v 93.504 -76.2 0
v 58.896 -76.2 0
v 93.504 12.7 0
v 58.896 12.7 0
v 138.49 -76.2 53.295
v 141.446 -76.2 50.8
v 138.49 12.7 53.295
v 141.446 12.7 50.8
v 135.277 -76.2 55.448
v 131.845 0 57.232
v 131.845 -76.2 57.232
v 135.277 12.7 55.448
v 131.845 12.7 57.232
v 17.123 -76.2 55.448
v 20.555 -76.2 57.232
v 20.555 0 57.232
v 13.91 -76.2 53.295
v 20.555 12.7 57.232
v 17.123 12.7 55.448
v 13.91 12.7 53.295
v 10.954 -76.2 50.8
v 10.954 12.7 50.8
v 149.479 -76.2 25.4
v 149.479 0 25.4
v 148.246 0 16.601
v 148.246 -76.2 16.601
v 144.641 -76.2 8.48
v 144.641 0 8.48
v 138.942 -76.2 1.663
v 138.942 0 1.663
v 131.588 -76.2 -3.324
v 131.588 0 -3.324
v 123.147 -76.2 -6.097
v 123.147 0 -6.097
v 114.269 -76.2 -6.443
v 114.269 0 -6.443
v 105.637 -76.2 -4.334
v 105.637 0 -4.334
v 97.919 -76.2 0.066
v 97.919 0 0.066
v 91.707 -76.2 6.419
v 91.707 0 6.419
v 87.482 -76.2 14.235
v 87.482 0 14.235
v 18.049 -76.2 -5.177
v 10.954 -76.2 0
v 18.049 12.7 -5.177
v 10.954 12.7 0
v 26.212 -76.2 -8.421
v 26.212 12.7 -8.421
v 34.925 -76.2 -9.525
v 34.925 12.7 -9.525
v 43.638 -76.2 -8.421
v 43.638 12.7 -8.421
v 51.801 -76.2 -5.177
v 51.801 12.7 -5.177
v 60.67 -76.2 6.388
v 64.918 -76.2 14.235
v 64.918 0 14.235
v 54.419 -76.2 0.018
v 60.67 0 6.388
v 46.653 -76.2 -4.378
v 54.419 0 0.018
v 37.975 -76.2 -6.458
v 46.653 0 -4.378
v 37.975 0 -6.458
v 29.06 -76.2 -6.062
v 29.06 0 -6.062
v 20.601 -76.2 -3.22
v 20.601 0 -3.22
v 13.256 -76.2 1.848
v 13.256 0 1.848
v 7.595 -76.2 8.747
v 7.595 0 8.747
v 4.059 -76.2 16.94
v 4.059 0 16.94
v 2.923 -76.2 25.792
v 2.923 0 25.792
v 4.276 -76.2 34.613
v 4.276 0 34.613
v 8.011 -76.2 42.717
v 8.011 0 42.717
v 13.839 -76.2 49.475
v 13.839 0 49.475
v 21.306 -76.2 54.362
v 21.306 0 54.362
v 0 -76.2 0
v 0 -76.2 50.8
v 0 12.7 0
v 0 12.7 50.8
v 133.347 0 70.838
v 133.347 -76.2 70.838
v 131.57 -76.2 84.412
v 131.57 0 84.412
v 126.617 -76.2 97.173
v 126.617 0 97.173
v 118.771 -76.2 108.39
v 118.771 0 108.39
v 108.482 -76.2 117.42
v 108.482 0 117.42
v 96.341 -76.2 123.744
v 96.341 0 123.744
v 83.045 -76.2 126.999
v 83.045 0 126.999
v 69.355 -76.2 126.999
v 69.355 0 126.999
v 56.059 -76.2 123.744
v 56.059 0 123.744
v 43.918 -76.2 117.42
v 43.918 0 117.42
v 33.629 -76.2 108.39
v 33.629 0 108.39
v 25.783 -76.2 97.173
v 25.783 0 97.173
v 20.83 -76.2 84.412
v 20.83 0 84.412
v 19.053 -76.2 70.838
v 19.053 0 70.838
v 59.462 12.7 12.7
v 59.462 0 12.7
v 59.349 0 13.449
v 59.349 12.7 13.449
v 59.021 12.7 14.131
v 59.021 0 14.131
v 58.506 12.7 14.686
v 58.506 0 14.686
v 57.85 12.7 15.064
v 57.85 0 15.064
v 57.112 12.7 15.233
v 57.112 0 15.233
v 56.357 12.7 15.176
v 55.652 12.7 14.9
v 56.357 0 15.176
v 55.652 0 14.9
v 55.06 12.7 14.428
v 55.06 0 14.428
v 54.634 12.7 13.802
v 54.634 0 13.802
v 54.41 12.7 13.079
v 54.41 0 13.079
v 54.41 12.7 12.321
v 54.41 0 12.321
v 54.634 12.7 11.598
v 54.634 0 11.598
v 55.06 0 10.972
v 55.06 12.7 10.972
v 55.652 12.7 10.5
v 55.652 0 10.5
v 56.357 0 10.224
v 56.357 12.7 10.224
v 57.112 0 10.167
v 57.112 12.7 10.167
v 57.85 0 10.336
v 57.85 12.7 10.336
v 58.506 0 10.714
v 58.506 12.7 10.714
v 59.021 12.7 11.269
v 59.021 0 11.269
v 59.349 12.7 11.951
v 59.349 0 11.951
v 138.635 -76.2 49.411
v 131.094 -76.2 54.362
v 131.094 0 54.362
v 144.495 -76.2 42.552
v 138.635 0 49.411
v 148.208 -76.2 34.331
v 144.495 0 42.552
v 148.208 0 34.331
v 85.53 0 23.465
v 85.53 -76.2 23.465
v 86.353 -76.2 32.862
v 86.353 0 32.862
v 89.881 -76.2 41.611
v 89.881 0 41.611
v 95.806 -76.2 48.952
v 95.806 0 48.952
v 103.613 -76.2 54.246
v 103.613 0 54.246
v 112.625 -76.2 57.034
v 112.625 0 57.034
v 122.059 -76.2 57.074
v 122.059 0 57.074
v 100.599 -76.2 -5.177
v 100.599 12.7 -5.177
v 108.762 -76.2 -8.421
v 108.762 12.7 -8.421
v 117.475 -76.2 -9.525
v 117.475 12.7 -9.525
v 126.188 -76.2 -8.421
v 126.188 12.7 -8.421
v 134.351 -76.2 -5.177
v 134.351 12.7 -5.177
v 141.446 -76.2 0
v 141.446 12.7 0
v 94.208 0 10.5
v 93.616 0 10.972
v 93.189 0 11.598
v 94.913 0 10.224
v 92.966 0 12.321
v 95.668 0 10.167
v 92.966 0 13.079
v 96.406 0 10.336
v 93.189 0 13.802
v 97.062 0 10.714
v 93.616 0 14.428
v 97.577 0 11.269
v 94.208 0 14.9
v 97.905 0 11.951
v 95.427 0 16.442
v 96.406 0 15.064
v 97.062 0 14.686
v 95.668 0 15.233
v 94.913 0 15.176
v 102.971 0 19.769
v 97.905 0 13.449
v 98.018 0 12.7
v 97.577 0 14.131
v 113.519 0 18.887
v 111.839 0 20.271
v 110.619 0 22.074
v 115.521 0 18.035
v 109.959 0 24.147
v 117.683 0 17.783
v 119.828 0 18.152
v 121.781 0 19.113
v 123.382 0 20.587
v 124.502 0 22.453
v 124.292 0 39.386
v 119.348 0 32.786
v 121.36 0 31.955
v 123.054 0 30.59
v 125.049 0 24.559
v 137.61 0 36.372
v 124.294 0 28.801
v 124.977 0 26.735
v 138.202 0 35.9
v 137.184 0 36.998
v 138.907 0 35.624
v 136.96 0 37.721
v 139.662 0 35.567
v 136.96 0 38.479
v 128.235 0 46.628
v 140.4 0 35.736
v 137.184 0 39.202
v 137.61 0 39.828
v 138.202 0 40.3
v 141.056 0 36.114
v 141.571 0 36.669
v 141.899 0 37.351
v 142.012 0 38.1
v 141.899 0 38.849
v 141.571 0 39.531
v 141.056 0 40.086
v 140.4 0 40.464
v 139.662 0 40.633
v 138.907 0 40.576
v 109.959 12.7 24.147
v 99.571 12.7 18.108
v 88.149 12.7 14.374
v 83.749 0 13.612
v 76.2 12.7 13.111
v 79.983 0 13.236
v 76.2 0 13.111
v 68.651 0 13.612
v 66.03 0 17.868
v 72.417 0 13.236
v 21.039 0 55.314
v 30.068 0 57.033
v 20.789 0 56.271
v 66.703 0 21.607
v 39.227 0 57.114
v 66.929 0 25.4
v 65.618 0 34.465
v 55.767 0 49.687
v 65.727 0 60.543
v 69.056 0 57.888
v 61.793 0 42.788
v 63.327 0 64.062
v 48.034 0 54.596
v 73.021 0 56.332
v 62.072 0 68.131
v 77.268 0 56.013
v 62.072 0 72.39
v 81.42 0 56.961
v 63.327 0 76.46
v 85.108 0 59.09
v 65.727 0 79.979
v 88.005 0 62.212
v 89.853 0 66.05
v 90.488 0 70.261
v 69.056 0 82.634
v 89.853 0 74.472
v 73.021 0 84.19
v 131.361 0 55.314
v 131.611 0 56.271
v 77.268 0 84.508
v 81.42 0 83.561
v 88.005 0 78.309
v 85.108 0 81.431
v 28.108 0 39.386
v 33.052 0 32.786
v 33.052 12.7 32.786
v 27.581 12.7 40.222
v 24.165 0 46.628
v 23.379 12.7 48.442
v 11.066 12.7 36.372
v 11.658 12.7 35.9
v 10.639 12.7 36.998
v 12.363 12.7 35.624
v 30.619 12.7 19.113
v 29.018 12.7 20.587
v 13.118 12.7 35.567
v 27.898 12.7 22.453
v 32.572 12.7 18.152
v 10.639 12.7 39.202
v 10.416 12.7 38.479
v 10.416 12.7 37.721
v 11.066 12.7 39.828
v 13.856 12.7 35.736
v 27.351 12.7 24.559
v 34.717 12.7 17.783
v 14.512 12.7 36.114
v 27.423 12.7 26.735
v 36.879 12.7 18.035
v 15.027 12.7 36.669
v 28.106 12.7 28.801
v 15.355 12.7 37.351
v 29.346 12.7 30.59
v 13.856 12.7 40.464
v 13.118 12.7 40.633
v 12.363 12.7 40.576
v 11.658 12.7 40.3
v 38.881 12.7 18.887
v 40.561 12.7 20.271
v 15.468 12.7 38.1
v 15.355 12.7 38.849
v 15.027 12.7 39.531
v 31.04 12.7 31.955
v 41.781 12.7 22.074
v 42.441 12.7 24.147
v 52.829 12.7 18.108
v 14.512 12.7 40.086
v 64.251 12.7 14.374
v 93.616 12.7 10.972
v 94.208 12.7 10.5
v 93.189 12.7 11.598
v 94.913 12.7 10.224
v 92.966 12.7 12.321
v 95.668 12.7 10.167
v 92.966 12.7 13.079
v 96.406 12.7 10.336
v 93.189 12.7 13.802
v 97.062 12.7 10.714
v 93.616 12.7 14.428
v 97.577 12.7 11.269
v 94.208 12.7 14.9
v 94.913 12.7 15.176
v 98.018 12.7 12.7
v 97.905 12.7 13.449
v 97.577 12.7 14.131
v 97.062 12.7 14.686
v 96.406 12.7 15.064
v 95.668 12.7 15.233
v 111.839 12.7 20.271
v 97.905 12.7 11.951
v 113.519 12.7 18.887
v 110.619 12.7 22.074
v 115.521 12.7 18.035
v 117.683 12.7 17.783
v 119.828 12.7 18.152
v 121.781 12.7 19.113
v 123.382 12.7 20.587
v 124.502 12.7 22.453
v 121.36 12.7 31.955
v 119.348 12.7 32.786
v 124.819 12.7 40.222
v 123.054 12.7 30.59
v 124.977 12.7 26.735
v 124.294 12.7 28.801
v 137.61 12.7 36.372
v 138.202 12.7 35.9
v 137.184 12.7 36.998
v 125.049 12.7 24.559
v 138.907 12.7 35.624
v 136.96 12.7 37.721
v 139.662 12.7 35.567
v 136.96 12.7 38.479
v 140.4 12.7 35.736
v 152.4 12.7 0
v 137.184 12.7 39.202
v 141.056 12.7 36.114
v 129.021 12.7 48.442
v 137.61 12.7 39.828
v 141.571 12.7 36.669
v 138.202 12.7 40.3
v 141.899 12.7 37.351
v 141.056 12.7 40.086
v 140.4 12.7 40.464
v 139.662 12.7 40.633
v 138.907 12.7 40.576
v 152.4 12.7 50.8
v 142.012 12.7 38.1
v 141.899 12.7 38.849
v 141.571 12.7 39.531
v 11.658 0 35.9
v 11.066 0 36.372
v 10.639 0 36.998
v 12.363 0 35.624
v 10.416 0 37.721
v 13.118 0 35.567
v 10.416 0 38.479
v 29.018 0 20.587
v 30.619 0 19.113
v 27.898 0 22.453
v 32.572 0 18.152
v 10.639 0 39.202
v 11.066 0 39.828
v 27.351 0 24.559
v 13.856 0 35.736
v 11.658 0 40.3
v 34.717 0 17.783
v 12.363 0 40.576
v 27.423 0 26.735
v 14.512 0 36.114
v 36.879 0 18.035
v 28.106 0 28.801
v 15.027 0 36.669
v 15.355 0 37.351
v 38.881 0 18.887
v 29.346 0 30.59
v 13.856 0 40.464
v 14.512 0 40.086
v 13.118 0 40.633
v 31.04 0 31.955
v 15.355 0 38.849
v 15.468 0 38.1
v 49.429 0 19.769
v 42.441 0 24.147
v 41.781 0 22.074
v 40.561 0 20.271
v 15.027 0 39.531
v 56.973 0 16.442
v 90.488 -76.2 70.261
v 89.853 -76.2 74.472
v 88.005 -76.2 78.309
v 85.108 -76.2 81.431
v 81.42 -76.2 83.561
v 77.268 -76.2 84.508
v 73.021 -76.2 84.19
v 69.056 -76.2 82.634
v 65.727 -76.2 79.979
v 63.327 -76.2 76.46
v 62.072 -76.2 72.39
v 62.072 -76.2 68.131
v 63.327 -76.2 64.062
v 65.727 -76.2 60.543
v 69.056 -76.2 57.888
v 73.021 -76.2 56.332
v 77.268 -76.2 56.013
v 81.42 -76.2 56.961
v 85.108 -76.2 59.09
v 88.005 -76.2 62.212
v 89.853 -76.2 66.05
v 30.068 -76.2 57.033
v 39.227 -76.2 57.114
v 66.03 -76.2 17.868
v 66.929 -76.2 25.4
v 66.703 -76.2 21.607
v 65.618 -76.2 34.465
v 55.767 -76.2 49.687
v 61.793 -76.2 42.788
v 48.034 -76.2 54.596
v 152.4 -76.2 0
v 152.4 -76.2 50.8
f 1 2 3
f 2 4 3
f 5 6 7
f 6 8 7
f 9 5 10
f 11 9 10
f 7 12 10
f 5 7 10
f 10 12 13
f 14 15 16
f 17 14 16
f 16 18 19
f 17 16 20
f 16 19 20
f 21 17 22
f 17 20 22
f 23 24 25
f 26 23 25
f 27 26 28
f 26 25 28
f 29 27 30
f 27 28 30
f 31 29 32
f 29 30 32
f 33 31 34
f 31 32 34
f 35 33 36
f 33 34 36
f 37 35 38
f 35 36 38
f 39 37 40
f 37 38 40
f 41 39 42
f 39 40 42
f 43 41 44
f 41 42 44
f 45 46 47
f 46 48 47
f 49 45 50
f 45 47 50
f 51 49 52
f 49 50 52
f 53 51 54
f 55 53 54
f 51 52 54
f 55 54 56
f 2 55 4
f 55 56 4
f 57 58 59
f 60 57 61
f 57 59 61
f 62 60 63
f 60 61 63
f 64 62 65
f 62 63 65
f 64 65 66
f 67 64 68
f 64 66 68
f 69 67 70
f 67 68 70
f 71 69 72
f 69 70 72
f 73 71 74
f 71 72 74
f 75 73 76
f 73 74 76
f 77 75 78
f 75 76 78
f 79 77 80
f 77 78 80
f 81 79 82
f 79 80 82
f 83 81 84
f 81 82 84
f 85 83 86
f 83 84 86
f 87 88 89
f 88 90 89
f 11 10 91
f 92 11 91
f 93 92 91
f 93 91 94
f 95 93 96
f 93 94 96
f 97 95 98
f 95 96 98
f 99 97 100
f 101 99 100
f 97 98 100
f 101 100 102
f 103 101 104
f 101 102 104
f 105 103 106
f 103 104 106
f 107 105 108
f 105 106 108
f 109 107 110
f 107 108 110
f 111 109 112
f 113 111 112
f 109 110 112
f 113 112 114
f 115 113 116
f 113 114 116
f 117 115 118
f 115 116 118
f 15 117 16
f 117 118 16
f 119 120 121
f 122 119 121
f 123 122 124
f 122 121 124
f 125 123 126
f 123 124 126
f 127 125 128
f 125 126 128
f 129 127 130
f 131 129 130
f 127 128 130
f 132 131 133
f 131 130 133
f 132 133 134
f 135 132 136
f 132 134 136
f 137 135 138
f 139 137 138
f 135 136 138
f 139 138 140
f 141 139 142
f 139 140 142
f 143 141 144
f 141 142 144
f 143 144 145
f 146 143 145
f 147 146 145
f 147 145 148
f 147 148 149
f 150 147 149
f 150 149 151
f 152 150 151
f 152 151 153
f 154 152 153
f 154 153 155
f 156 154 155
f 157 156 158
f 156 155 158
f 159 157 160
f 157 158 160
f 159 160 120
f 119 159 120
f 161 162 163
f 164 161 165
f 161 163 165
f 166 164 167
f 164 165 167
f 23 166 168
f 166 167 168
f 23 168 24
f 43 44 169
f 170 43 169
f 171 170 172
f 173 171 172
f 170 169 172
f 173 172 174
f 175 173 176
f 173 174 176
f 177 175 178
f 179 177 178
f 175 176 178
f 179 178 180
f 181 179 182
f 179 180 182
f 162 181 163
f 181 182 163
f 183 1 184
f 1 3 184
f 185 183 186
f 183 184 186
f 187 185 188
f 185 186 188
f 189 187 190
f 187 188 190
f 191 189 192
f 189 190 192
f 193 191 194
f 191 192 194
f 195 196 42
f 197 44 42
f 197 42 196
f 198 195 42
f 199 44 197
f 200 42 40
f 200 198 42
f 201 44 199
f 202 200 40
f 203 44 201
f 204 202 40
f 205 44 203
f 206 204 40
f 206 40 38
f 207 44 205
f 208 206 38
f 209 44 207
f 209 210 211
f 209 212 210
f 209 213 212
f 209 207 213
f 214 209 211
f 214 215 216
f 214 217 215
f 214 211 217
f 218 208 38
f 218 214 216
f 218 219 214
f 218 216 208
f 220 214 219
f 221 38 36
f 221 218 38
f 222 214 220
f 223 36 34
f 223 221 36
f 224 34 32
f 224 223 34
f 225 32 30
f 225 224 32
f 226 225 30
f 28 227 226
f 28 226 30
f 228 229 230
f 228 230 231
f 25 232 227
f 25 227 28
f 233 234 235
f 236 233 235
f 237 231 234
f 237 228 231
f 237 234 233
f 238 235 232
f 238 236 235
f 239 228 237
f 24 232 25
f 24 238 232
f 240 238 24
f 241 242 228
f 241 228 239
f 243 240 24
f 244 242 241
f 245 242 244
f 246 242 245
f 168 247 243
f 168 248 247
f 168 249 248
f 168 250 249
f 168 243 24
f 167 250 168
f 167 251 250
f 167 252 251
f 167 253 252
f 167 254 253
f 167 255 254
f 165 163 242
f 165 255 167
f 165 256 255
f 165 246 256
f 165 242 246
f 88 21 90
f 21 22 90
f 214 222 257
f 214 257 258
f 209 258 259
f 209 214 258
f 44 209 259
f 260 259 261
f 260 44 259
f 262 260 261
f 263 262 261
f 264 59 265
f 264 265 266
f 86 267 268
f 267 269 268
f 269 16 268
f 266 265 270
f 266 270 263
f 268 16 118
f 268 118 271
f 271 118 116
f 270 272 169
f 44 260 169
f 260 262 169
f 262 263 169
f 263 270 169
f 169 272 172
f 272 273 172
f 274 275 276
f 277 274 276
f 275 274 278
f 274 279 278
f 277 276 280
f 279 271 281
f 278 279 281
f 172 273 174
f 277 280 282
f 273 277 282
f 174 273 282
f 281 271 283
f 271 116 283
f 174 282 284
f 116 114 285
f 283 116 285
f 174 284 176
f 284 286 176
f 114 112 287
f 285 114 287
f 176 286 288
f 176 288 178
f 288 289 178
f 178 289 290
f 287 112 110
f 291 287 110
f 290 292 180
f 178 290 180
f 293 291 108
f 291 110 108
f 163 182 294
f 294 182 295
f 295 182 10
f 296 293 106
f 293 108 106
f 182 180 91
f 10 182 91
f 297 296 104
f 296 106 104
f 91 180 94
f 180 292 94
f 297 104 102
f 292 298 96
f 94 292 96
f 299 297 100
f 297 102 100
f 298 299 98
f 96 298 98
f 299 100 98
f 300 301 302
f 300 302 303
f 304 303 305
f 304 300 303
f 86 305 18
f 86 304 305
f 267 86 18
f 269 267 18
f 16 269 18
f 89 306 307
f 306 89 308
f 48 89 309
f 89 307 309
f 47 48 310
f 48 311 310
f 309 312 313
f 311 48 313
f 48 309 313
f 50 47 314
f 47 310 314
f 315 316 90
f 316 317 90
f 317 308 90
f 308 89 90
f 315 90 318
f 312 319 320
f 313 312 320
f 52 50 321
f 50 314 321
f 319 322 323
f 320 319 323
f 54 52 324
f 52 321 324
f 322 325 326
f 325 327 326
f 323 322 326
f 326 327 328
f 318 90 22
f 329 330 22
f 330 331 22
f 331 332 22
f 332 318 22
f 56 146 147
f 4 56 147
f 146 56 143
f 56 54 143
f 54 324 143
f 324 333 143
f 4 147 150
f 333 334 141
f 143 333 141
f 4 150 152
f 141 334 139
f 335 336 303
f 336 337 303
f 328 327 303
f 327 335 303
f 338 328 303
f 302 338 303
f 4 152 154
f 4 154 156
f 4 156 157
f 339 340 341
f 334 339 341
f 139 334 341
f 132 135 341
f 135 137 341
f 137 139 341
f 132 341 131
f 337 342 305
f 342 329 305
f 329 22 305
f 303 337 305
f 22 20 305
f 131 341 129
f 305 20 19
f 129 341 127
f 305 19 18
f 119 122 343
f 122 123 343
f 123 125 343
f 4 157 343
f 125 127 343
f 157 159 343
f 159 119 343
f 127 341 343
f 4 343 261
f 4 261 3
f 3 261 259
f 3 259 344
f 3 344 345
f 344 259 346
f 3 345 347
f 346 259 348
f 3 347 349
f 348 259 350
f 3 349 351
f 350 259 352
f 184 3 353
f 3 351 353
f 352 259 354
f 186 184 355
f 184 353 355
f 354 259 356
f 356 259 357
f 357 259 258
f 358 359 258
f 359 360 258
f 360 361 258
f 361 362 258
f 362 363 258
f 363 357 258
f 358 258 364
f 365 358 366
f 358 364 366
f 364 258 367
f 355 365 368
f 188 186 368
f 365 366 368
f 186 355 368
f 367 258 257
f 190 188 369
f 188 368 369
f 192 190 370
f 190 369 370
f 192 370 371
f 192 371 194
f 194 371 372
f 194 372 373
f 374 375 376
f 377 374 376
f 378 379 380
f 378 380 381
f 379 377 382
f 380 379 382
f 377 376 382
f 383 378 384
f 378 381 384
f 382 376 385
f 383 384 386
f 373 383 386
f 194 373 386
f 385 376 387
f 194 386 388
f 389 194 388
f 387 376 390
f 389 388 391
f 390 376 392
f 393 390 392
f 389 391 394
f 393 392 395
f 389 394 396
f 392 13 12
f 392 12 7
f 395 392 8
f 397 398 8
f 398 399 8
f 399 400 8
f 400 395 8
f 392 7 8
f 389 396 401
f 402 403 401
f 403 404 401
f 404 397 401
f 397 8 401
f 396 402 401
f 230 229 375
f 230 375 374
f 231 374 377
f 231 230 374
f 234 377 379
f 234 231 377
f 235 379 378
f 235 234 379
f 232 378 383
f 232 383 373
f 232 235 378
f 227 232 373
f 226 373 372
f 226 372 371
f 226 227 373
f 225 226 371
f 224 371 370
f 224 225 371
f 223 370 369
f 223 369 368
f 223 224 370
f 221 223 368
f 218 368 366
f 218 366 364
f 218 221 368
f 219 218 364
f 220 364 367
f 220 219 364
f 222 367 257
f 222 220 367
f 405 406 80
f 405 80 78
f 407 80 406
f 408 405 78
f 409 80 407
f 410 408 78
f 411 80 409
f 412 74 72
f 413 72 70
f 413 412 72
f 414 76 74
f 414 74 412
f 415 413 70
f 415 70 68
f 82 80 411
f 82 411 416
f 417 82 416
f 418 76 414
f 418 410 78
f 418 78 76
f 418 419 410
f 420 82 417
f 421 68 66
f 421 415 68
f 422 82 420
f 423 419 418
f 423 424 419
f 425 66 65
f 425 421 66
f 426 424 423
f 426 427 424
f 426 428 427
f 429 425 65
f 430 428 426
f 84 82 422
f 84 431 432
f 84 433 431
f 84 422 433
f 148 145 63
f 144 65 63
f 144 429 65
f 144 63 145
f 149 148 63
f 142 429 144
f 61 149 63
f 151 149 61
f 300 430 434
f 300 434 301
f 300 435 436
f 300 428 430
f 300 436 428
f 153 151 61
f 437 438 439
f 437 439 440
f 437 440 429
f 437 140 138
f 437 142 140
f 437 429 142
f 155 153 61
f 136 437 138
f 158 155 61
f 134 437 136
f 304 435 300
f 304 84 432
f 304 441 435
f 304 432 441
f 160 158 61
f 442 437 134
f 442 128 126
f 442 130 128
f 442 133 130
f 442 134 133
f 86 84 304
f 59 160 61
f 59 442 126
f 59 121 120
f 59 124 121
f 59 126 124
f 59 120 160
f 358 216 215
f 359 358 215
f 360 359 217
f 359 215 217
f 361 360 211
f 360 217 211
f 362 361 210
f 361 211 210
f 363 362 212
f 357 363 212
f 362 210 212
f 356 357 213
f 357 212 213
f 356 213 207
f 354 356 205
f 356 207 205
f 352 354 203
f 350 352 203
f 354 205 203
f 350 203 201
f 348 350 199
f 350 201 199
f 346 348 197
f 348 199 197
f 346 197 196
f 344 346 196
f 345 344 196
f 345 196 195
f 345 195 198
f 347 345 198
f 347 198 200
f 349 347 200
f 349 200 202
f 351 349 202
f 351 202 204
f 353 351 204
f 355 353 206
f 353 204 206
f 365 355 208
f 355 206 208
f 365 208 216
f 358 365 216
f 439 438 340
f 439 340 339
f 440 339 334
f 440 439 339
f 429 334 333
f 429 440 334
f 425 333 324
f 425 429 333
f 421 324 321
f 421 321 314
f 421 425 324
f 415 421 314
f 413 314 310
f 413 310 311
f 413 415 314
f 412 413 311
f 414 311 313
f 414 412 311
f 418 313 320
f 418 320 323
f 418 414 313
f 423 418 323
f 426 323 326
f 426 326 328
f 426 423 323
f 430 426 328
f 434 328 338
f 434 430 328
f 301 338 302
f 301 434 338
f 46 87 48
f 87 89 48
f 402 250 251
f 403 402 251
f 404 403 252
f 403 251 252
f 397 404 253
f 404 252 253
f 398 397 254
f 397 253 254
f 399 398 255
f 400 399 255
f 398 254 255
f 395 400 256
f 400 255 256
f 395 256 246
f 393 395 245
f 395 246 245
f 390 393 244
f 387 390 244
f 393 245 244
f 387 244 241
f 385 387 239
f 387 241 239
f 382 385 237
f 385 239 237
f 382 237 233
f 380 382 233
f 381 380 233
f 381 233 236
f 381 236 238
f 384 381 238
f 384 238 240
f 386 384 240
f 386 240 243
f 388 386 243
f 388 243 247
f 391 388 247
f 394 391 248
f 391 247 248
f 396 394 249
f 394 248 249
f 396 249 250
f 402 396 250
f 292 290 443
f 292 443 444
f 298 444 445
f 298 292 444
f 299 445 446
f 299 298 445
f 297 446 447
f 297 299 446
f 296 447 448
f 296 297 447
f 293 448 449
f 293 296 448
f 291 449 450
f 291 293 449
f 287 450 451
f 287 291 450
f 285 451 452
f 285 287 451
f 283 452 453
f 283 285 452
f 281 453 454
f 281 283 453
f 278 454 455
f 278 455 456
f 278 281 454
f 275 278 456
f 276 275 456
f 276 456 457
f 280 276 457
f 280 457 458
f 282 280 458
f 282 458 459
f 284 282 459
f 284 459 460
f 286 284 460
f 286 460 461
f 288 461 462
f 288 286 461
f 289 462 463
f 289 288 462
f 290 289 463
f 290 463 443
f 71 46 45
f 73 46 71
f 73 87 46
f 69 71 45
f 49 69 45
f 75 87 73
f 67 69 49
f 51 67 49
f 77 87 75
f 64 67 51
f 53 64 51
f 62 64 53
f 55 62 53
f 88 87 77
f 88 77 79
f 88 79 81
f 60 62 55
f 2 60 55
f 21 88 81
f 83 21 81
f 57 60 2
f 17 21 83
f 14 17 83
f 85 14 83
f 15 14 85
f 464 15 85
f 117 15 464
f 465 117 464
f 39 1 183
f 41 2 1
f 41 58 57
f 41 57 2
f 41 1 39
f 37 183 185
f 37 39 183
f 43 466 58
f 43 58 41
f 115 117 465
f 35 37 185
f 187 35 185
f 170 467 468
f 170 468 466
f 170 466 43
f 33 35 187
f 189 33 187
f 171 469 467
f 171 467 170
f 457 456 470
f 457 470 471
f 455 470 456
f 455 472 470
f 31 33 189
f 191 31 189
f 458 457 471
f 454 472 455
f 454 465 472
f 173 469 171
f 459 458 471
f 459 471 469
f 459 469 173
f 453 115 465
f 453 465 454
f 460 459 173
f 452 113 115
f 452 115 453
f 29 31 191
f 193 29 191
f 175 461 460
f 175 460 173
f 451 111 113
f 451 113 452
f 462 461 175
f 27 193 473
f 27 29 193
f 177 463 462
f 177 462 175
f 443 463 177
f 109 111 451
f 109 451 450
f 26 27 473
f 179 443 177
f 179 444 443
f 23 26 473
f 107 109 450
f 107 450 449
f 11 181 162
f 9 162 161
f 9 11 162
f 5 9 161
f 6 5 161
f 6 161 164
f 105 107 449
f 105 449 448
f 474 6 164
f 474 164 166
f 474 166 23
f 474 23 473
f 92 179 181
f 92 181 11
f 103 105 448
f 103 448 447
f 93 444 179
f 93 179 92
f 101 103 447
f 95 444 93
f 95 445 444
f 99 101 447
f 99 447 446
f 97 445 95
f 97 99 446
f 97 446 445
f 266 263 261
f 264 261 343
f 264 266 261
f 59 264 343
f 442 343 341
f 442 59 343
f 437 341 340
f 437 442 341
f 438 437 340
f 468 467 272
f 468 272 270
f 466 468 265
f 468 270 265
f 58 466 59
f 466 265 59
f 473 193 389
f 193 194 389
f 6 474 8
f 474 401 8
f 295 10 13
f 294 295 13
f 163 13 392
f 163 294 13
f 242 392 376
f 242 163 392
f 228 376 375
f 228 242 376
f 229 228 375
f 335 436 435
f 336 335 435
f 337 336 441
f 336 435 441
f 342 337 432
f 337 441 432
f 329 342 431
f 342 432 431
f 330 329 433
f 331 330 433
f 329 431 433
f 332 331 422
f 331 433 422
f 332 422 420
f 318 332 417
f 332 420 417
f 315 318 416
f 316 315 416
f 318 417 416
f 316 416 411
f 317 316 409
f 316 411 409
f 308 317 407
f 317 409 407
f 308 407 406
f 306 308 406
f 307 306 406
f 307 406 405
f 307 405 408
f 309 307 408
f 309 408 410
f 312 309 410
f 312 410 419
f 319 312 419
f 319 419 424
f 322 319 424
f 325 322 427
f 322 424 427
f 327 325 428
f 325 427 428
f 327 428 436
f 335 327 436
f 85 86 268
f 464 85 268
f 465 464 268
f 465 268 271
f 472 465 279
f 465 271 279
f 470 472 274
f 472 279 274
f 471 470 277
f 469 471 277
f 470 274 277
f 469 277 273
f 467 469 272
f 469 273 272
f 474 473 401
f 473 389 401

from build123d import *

# Parameters (mm, degrees)
F0_R     = 2.54
F1_DEPTH = 12.7
F2_R     = 14.2875
F3_DEPTH = 76.2


with BuildPart() as f1:
    # F0 (on Front) → F1 (new body)
    with BuildSketch(Plane.XZ):
        with BuildLine():
            Line((0, 50.8), (0, 0))
            Line((0, 0), (10.954276, 0))
            ThreePointArc((10.954276, 0), (34.925, -9.525), (58.895724, 0))
            Line((58.895724, 0), (76.2, 0))
            Line((76.2, 0), (76.2, 13.110851))
            ThreePointArc((76.2, 13.110851), (58.441553, 15.939952), (42.441301, 24.147157))
            ThreePointArc((42.441301, 24.147157), (29.765625, 19.792394), (33.051765, 32.786162))
            ThreePointArc((33.051765, 32.786162), (25.31364, 44.247376), (20.555013, 57.231731))
            ThreePointArc((20.555013, 57.231731), (15.486782, 54.415708), (10.954276, 50.8))
            Line((10.954276, 50.8), (0, 50.8))
        make_face()
        with Locations((56.922045, 12.7)):
            Circle(F0_R, mode=Mode.SUBTRACT)
        with Locations((12.927955, 38.1)):
            Circle(F0_R, mode=Mode.SUBTRACT)
        with BuildLine():
            Line((76.2, 13.110851), (76.2, 0))
            Line((76.2, 0), (93.504276, 0))
            ThreePointArc((93.504276, 0), (117.475, -9.525), (141.445724, 0))
            Line((141.445724, 0), (152.4, 0))
            Line((152.4, 0), (152.4, 50.8))
            Line((152.4, 50.8), (141.445724, 50.8))
            ThreePointArc((141.445724, 50.8), (136.913218, 54.415708), (131.844987, 57.231731))
            ThreePointArc((131.844987, 57.231731), (127.08636, 44.247376), (119.348235, 32.786162))
            ThreePointArc((119.348235, 32.786162), (122.634375, 19.792394), (109.958699, 24.147157))
            ThreePointArc((109.958699, 24.147157), (93.958447, 15.939952), (76.2, 13.110851))
        make_face()
        with Locations((95.477955, 12.7)):
            Circle(F0_R, mode=Mode.SUBTRACT)
        with Locations((139.472045, 38.1)):
            Circle(F0_R, mode=Mode.SUBTRACT)
    extrude(amount=-F1_DEPTH)

    # F2 (on face) → F3 (join)
    with BuildSketch(Plane.XZ):
        with BuildLine():
            ThreePointArc((66.929, 25.4), (66.422356, 19.727915), (64.918467, 14.235415))
            ThreePointArc((64.918467, 14.235415), (70.531278, 13.392687), (76.2, 13.110851))
            ThreePointArc((76.2, 13.110851), (81.868722, 13.392687), (87.481533, 14.235415))
            ThreePointArc((87.481533, 14.235415), (95.805625, 48.951947), (131.0939, 54.361726))
            ThreePointArc((131.0939, 54.361726), (131.488069, 55.791854), (131.844987, 57.231731))
            ThreePointArc((131.844987, 57.231731), (76.2, 127.410851), (20.555013, 57.231731))
            ThreePointArc((20.555013, 57.231731), (20.911931, 55.791854), (21.3061, 54.361726))
            ThreePointArc((21.3061, 54.361726), (52.077212, 52.419579), (66.929, 25.4))
        make_face()
        with Locations((76.2, 70.260851)):
            Circle(F2_R, mode=Mode.SUBTRACT)
        with BuildLine():
            ThreePointArc((76.2, 13.110851), (70.531278, 13.392687), (64.918467, 14.235415))
            ThreePointArc((64.918467, 14.235415), (13.255625, 1.848053), (21.3061, 54.361726))
            ThreePointArc((21.3061, 54.361726), (20.911931, 55.791854), (20.555013, 57.231731))
            ThreePointArc((20.555013, 57.231731), (15.486782, 54.415708), (10.954276, 50.8))
            Line((10.954276, 50.8), (0, 50.8))
            Line((0, 50.8), (0, 0))
            Line((0, 0), (10.954276, 0))
            ThreePointArc((10.954276, 0), (34.925, -9.525), (58.895724, 0))
            Line((58.895724, 0), (76.2, 0))
            Line((76.2, 0), (93.504276, 0))
            ThreePointArc((93.504276, 0), (117.475, -9.525), (141.445724, 0))
            Line((141.445724, 0), (152.4, 0))
            Line((152.4, 0), (152.4, 50.8))
            Line((152.4, 50.8), (141.445724, 50.8))
            ThreePointArc((141.445724, 50.8), (136.913218, 54.415708), (131.844987, 57.231731))
            ThreePointArc((131.844987, 57.231731), (131.488069, 55.791854), (131.0939, 54.361726))
            ThreePointArc((131.0939, 54.361726), (144.494579, 42.552212), (149.479, 25.4))
            ThreePointArc((149.479, 25.4), (123.147085, -6.097356), (87.481533, 14.235415))
            ThreePointArc((87.481533, 14.235415), (81.868722, 13.392687), (76.2, 13.110851))
        make_face()
    extrude(amount=F3_DEPTH)


solid = f1.part
